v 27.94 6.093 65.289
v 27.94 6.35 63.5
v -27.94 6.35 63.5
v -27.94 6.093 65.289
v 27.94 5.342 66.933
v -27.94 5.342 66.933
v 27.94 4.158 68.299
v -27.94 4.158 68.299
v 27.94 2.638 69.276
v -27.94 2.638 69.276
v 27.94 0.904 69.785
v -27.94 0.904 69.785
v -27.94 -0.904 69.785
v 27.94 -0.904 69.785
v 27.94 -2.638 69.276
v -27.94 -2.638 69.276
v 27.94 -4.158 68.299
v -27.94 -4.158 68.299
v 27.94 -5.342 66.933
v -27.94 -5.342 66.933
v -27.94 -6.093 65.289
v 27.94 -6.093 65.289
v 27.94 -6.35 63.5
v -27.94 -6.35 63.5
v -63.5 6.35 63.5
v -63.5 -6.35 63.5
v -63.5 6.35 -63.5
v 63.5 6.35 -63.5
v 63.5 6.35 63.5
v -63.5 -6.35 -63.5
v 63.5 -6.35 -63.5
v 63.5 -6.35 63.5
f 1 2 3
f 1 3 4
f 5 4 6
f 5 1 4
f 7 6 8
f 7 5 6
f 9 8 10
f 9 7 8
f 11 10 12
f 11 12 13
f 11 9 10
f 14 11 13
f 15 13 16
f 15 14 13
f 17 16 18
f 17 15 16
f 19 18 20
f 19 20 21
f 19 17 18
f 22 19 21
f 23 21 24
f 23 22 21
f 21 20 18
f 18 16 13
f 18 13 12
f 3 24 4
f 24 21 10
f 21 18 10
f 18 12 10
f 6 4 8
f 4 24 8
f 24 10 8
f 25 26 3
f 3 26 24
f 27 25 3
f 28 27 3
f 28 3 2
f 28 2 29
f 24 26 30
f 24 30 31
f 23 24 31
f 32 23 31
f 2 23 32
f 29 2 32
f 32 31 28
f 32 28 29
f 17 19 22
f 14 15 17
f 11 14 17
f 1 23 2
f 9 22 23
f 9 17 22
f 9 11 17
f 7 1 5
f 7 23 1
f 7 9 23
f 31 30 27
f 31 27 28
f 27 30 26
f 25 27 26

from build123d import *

# Parameters (mm, degrees)
F0_W     = 127
F0_H     = 127
F1_DEPTH = 6.35
F2_R     = 6.35
F3_DEPTH = 27.94


with BuildPart() as f1:
    # F0 (on Front) → F1 (new body, symmetric)
    with BuildSketch(Plane.XZ):
        Rectangle(F0_W, F0_H)
    extrude(amount=F1_DEPTH, both=True)

    # F2 (on Right) → F3 (join, symmetric)
    with BuildSketch(Plane.YZ):
        with Locations((0, 63.5)):
            Circle(F2_R)
    extrude(amount=F3_DEPTH, both=True)


solid = f1.part
